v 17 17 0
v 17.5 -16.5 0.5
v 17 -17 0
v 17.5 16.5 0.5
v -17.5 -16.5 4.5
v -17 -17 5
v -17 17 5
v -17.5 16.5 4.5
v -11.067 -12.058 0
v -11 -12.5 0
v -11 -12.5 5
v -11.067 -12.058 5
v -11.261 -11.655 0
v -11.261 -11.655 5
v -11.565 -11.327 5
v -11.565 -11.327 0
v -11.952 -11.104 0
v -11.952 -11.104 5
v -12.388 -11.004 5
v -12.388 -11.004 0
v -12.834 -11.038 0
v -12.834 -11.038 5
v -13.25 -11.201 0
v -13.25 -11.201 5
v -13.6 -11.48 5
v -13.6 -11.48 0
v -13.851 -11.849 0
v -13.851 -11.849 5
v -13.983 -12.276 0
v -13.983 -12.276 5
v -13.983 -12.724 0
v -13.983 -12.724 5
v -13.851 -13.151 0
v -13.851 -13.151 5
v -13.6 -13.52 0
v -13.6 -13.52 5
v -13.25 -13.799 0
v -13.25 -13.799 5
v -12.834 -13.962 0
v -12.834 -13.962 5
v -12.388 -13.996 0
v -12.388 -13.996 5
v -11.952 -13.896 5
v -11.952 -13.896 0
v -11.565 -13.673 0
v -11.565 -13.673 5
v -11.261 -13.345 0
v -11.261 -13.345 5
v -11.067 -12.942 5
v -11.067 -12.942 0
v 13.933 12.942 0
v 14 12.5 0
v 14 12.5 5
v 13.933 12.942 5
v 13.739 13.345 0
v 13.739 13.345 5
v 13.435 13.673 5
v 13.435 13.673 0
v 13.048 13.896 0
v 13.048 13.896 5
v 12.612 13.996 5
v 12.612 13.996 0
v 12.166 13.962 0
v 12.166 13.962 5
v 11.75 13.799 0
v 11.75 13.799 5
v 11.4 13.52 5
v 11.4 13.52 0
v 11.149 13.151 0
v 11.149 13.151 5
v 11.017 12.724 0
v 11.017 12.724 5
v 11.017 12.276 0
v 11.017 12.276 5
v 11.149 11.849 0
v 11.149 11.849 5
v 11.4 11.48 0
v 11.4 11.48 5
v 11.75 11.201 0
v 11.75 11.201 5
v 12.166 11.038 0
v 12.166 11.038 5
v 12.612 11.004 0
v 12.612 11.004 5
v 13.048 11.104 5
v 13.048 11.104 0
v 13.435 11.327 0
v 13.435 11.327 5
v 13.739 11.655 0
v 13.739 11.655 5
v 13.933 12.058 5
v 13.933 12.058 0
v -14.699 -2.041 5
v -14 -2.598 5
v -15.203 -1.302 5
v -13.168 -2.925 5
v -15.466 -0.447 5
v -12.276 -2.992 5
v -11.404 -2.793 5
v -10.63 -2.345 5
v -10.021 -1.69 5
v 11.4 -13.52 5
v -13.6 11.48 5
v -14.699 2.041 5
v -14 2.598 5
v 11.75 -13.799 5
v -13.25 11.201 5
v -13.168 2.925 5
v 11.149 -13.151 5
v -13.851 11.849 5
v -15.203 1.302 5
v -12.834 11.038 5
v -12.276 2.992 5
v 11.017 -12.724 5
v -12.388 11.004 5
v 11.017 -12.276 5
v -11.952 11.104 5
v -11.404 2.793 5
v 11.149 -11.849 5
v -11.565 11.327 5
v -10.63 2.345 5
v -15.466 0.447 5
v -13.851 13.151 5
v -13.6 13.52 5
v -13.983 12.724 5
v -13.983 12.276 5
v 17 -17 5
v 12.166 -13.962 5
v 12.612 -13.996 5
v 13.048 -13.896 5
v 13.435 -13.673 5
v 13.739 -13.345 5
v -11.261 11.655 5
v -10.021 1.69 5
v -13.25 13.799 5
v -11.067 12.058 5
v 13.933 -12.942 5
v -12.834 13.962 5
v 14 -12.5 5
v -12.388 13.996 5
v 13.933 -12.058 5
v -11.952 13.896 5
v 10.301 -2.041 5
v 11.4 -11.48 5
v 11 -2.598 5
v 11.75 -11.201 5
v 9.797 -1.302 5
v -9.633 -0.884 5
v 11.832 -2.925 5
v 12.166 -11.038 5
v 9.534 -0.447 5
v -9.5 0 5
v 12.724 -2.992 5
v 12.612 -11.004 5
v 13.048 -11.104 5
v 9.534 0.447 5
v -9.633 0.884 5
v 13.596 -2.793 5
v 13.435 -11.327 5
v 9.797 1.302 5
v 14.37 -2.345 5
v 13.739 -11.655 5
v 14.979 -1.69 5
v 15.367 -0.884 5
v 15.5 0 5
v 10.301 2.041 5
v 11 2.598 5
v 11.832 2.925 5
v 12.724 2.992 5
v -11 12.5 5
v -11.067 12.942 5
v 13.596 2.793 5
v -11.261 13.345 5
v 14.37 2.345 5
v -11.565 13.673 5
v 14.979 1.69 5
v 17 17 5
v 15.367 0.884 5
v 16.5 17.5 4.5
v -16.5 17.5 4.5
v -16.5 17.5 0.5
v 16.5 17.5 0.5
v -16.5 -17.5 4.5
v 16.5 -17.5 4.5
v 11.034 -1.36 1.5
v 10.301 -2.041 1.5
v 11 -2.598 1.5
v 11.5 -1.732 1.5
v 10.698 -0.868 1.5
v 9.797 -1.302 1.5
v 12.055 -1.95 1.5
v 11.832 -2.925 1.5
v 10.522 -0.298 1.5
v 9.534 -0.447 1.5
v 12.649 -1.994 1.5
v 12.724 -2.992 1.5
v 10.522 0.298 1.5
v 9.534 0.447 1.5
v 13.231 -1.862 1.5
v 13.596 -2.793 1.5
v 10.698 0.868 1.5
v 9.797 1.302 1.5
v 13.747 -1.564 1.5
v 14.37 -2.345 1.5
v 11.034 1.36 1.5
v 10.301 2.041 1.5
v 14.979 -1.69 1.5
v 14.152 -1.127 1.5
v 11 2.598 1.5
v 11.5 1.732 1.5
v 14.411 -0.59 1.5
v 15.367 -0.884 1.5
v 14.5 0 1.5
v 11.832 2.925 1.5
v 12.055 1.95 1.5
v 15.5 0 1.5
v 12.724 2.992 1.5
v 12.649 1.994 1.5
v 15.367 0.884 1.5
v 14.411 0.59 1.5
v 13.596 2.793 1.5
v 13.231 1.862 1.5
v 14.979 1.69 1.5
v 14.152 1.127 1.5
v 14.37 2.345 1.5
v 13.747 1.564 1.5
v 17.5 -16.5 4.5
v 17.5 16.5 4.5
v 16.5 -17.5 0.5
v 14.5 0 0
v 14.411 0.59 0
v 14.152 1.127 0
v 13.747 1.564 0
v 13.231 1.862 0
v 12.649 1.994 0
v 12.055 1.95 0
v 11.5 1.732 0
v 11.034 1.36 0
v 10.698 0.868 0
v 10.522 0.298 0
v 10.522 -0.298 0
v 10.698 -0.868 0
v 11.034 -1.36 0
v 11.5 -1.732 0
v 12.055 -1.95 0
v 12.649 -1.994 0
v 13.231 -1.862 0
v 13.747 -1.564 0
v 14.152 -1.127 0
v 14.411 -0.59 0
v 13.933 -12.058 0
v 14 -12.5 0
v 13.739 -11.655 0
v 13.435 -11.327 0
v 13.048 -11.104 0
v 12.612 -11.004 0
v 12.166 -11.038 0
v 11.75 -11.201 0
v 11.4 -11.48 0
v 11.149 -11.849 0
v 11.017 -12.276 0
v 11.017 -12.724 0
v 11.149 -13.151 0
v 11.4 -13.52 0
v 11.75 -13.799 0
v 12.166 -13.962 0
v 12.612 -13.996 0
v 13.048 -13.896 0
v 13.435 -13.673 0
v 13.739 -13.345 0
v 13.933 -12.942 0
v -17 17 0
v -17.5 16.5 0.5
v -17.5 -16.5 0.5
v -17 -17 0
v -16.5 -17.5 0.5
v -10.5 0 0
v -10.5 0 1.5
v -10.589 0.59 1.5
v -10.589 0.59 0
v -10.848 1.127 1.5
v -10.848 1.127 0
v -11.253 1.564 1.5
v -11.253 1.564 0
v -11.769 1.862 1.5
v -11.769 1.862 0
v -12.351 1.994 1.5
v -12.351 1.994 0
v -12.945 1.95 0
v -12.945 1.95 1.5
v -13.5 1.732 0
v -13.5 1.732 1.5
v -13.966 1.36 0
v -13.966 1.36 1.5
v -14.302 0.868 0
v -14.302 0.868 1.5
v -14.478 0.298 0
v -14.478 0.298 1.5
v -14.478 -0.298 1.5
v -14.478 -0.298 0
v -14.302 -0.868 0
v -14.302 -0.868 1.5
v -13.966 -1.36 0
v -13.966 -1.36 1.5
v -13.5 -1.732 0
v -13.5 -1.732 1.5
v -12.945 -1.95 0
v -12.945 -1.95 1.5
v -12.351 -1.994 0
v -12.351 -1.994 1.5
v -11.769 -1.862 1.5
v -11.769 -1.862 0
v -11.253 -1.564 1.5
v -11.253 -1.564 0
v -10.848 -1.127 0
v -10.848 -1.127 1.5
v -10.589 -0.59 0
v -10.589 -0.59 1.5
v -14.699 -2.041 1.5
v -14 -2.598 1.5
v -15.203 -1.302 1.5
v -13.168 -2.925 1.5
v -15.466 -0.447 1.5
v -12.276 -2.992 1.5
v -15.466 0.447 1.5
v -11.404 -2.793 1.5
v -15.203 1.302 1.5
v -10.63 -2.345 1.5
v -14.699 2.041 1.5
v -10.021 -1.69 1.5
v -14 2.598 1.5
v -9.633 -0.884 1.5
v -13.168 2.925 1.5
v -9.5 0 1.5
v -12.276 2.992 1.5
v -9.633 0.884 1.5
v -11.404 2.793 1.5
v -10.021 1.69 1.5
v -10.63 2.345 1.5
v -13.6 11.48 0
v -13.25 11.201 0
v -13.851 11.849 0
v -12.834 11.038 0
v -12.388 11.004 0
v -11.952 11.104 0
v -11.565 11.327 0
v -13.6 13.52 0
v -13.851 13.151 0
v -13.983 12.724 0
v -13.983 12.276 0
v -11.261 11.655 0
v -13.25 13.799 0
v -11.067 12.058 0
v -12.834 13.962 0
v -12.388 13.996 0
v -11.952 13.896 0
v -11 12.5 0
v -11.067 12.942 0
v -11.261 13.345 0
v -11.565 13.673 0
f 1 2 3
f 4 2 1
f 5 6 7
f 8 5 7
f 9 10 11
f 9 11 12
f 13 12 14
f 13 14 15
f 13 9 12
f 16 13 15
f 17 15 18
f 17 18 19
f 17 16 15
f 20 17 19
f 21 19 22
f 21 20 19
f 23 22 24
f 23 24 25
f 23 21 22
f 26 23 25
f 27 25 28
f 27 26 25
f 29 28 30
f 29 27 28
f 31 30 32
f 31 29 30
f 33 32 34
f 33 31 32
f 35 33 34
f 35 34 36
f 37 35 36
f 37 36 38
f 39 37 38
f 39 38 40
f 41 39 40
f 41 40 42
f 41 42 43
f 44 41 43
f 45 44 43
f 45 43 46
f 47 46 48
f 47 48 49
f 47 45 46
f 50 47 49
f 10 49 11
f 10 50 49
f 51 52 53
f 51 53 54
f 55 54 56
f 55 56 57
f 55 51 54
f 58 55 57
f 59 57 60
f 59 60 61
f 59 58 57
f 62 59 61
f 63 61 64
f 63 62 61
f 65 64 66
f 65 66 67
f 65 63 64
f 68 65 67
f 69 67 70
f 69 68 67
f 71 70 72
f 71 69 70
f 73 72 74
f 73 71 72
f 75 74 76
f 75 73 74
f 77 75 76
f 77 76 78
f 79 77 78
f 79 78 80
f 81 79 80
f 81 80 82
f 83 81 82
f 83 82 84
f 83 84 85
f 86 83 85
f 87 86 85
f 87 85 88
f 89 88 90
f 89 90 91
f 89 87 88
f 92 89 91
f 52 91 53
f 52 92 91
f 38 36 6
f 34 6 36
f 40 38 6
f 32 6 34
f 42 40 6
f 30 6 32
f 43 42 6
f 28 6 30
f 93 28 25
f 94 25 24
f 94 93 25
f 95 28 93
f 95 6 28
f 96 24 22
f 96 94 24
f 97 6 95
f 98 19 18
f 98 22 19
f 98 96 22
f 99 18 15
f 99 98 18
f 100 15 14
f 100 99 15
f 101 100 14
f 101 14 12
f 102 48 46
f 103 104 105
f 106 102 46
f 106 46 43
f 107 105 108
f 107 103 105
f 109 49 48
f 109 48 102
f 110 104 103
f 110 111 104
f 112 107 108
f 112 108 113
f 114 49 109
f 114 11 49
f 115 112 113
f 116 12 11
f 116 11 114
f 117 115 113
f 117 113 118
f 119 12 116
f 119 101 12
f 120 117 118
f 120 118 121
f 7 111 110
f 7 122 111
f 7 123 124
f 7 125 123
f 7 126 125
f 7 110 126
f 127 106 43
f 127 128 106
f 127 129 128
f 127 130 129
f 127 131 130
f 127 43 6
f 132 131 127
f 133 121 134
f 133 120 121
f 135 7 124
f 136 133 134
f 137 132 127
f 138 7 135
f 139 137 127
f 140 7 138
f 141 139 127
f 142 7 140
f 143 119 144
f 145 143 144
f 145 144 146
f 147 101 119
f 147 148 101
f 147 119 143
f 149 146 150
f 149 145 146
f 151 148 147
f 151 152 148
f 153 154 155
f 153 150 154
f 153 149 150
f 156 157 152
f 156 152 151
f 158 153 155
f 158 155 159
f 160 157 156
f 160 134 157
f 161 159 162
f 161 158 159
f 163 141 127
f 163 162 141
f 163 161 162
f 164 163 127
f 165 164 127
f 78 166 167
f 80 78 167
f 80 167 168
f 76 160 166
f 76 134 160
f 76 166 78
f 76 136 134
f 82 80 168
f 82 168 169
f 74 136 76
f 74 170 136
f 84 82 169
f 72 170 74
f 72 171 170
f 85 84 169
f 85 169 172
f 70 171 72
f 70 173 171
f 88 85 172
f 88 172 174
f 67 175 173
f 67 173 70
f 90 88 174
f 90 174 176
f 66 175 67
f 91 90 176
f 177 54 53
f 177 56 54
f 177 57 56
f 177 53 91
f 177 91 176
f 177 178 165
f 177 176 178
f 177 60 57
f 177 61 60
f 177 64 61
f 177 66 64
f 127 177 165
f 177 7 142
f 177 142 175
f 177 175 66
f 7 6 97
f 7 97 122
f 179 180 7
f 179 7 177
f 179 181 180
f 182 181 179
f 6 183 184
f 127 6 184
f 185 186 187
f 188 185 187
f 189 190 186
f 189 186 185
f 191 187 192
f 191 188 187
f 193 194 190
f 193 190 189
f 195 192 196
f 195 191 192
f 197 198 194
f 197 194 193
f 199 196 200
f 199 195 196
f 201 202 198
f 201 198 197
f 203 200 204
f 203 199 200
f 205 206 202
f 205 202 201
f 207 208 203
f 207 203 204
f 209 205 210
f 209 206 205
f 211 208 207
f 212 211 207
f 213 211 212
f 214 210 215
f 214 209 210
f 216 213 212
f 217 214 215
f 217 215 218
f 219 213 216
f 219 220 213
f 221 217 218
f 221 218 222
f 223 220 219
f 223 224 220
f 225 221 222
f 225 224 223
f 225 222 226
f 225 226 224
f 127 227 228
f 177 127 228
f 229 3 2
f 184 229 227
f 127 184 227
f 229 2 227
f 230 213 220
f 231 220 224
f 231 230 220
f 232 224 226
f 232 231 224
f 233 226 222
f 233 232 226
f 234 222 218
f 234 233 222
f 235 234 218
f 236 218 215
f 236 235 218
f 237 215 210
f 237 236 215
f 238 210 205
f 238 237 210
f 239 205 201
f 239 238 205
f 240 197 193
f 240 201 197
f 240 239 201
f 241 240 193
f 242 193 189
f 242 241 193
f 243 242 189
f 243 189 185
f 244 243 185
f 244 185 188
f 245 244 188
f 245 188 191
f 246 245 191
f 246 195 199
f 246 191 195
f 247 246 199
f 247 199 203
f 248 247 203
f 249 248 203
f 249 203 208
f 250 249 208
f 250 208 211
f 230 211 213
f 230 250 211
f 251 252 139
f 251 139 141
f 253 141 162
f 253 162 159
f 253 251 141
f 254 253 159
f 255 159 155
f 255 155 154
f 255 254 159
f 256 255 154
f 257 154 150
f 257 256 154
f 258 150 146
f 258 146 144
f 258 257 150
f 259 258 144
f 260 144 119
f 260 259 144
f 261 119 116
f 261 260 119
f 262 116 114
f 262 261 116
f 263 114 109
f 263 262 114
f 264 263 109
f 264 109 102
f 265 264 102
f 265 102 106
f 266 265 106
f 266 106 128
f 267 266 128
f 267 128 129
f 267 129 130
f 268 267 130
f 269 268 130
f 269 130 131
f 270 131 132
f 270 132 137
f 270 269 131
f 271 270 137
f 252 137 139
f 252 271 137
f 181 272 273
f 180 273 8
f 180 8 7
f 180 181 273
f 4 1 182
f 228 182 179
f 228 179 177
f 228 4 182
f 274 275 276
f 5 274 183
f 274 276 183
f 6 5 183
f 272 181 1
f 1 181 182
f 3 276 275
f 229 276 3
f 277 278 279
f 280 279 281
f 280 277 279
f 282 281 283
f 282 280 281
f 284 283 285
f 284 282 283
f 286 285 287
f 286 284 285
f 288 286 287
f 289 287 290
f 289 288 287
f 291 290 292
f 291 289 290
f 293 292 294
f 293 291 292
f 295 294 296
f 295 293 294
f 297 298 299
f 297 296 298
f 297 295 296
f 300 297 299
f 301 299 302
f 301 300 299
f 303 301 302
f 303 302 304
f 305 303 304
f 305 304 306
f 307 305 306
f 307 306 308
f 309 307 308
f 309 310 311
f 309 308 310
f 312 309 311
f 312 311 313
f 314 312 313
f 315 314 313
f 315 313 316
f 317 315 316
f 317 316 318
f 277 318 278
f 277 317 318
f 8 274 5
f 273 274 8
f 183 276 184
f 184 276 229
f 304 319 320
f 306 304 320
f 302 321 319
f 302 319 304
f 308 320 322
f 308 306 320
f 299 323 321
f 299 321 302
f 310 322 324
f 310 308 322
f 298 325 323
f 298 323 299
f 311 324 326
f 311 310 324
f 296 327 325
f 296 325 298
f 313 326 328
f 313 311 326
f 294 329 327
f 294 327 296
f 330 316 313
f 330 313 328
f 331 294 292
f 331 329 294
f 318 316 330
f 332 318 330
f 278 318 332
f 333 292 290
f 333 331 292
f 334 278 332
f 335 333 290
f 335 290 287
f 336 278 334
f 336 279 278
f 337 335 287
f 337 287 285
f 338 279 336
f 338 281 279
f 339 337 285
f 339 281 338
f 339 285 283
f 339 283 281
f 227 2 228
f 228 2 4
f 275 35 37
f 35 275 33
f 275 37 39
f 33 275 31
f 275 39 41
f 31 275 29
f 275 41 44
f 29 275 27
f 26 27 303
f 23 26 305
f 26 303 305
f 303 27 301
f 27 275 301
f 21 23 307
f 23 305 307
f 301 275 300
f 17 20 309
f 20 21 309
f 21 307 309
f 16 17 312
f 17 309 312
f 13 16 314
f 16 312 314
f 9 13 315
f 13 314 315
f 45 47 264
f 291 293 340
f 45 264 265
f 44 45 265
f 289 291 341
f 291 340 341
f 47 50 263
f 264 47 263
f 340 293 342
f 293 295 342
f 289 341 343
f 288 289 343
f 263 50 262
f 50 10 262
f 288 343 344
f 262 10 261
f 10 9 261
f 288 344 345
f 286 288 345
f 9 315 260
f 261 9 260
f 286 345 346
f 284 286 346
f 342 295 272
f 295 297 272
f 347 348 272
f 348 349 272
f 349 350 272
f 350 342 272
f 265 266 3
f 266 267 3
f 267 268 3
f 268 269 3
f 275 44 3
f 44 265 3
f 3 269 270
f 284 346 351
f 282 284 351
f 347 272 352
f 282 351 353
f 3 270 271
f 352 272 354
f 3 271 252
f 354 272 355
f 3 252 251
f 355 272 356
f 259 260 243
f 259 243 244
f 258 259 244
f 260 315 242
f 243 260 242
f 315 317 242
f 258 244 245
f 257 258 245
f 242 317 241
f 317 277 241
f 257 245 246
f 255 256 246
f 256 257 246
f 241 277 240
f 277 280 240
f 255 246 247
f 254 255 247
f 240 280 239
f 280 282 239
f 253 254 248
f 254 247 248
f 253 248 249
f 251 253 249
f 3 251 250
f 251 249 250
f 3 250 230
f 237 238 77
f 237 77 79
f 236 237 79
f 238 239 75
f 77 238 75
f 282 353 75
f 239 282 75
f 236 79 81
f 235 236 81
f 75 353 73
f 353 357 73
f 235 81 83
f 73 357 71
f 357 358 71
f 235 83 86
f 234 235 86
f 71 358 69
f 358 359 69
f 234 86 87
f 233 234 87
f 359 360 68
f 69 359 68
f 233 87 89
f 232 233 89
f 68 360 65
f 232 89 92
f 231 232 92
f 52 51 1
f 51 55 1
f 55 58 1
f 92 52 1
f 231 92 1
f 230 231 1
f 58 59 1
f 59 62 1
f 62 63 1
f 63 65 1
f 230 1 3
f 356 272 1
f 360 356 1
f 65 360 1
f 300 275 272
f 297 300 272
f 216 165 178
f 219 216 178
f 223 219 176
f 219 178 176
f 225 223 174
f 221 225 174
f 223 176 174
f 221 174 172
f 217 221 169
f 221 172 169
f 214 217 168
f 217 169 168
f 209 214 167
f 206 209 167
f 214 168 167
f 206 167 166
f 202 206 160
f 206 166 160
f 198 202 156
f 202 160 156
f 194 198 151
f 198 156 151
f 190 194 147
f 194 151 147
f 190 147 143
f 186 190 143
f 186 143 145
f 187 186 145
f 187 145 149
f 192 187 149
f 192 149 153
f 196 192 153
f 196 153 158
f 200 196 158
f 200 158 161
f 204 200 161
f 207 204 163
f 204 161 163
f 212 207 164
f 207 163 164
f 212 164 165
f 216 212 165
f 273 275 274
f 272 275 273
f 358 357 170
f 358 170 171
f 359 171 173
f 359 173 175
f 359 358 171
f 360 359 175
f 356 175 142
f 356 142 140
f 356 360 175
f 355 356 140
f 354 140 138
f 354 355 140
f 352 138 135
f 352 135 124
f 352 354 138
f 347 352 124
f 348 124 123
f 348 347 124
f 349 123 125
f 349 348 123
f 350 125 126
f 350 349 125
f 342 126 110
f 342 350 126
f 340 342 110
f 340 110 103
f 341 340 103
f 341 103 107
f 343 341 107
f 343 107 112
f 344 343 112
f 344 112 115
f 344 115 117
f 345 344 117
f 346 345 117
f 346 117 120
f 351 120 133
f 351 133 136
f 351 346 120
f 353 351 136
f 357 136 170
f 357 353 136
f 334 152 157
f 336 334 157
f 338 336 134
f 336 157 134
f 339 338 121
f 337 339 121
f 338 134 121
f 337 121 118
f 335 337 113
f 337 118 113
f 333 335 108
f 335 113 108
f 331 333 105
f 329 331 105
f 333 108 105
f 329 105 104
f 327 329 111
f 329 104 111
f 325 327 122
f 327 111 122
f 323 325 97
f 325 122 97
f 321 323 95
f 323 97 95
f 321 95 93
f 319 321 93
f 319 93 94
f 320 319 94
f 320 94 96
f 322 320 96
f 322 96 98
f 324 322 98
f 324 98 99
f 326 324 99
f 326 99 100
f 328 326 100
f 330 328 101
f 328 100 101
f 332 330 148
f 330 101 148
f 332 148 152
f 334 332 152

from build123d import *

# Parameters (mm, degrees)
F0_W     = 35
F0_H     = 35
F0_R     = 1.5
F0_R_2   = 2
F1_DEPTH = 5
F2_R     = 3
F3_DEPTH = 3.5
F4_SIZE  = 1
F5_SIZE  = 0.49999


# Not quite as in the source:
# - a fillet or chamfer is up to 0.001 mm smaller than in the source, because OpenCascade refuses the exact size


with BuildPart() as f1:
    # F0 (on Top) → F1 (new body)
    with BuildSketch(Plane.XY):
        Rectangle(F0_W, F0_H)
        with Locations((-12.5, -12.5)):
            Circle(F0_R, mode=Mode.SUBTRACT)
        with Locations((12.5, -12.5)):
            Circle(F0_R, mode=Mode.SUBTRACT)
        with Locations((-12.5, 0)):
            Circle(F0_R_2, mode=Mode.SUBTRACT)
        with Locations((-12.5, 12.5)):
            Circle(F0_R, mode=Mode.SUBTRACT)
        with Locations((12.5, 0)):
            Circle(F0_R_2, mode=Mode.SUBTRACT)
        with Locations((12.5, 12.5)):
            Circle(F0_R, mode=Mode.SUBTRACT)
    extrude(amount=F1_DEPTH)

    # F2 (on face) → F3 (cut)
    with BuildSketch(Plane.XY.offset(5)):
        with Locations((-12.5, 0)):
            Circle(F2_R)
        with Locations((12.5, 0)):
            Circle(F2_R)
    extrude(amount=-F3_DEPTH, mode=Mode.SUBTRACT)

    # F4
    f4_edges = [f1.edges().sort_by_distance(p)[0] for p in [
        (-17.5, -17.5, 2.5),
        (-17.5, 17.5, 2.5),
        (17.5, -17.5, 2.5),
        (17.5, 17.5, 2.5),
    ]]
    chamfer(f4_edges, length=F4_SIZE)

    # F5 (size 0.5 in the source; OpenCascade refuses exactly that, so slightly less here)
    f5_edges = [f1.edges().sort_by_distance(p)[0] for p in [
        (17.5, 0, 5),
        (0, 17.5, 5),
        (-17.5, 0, 5),
        (17.5, 0, 0),
        (0, -17.5, 5),
        (0, -17.5, 0),
        (0, 17.5, 0),
        (-17.5, 0, 0),
    ]]
    chamfer(f5_edges, length=F5_SIZE)


solid = f1.part
